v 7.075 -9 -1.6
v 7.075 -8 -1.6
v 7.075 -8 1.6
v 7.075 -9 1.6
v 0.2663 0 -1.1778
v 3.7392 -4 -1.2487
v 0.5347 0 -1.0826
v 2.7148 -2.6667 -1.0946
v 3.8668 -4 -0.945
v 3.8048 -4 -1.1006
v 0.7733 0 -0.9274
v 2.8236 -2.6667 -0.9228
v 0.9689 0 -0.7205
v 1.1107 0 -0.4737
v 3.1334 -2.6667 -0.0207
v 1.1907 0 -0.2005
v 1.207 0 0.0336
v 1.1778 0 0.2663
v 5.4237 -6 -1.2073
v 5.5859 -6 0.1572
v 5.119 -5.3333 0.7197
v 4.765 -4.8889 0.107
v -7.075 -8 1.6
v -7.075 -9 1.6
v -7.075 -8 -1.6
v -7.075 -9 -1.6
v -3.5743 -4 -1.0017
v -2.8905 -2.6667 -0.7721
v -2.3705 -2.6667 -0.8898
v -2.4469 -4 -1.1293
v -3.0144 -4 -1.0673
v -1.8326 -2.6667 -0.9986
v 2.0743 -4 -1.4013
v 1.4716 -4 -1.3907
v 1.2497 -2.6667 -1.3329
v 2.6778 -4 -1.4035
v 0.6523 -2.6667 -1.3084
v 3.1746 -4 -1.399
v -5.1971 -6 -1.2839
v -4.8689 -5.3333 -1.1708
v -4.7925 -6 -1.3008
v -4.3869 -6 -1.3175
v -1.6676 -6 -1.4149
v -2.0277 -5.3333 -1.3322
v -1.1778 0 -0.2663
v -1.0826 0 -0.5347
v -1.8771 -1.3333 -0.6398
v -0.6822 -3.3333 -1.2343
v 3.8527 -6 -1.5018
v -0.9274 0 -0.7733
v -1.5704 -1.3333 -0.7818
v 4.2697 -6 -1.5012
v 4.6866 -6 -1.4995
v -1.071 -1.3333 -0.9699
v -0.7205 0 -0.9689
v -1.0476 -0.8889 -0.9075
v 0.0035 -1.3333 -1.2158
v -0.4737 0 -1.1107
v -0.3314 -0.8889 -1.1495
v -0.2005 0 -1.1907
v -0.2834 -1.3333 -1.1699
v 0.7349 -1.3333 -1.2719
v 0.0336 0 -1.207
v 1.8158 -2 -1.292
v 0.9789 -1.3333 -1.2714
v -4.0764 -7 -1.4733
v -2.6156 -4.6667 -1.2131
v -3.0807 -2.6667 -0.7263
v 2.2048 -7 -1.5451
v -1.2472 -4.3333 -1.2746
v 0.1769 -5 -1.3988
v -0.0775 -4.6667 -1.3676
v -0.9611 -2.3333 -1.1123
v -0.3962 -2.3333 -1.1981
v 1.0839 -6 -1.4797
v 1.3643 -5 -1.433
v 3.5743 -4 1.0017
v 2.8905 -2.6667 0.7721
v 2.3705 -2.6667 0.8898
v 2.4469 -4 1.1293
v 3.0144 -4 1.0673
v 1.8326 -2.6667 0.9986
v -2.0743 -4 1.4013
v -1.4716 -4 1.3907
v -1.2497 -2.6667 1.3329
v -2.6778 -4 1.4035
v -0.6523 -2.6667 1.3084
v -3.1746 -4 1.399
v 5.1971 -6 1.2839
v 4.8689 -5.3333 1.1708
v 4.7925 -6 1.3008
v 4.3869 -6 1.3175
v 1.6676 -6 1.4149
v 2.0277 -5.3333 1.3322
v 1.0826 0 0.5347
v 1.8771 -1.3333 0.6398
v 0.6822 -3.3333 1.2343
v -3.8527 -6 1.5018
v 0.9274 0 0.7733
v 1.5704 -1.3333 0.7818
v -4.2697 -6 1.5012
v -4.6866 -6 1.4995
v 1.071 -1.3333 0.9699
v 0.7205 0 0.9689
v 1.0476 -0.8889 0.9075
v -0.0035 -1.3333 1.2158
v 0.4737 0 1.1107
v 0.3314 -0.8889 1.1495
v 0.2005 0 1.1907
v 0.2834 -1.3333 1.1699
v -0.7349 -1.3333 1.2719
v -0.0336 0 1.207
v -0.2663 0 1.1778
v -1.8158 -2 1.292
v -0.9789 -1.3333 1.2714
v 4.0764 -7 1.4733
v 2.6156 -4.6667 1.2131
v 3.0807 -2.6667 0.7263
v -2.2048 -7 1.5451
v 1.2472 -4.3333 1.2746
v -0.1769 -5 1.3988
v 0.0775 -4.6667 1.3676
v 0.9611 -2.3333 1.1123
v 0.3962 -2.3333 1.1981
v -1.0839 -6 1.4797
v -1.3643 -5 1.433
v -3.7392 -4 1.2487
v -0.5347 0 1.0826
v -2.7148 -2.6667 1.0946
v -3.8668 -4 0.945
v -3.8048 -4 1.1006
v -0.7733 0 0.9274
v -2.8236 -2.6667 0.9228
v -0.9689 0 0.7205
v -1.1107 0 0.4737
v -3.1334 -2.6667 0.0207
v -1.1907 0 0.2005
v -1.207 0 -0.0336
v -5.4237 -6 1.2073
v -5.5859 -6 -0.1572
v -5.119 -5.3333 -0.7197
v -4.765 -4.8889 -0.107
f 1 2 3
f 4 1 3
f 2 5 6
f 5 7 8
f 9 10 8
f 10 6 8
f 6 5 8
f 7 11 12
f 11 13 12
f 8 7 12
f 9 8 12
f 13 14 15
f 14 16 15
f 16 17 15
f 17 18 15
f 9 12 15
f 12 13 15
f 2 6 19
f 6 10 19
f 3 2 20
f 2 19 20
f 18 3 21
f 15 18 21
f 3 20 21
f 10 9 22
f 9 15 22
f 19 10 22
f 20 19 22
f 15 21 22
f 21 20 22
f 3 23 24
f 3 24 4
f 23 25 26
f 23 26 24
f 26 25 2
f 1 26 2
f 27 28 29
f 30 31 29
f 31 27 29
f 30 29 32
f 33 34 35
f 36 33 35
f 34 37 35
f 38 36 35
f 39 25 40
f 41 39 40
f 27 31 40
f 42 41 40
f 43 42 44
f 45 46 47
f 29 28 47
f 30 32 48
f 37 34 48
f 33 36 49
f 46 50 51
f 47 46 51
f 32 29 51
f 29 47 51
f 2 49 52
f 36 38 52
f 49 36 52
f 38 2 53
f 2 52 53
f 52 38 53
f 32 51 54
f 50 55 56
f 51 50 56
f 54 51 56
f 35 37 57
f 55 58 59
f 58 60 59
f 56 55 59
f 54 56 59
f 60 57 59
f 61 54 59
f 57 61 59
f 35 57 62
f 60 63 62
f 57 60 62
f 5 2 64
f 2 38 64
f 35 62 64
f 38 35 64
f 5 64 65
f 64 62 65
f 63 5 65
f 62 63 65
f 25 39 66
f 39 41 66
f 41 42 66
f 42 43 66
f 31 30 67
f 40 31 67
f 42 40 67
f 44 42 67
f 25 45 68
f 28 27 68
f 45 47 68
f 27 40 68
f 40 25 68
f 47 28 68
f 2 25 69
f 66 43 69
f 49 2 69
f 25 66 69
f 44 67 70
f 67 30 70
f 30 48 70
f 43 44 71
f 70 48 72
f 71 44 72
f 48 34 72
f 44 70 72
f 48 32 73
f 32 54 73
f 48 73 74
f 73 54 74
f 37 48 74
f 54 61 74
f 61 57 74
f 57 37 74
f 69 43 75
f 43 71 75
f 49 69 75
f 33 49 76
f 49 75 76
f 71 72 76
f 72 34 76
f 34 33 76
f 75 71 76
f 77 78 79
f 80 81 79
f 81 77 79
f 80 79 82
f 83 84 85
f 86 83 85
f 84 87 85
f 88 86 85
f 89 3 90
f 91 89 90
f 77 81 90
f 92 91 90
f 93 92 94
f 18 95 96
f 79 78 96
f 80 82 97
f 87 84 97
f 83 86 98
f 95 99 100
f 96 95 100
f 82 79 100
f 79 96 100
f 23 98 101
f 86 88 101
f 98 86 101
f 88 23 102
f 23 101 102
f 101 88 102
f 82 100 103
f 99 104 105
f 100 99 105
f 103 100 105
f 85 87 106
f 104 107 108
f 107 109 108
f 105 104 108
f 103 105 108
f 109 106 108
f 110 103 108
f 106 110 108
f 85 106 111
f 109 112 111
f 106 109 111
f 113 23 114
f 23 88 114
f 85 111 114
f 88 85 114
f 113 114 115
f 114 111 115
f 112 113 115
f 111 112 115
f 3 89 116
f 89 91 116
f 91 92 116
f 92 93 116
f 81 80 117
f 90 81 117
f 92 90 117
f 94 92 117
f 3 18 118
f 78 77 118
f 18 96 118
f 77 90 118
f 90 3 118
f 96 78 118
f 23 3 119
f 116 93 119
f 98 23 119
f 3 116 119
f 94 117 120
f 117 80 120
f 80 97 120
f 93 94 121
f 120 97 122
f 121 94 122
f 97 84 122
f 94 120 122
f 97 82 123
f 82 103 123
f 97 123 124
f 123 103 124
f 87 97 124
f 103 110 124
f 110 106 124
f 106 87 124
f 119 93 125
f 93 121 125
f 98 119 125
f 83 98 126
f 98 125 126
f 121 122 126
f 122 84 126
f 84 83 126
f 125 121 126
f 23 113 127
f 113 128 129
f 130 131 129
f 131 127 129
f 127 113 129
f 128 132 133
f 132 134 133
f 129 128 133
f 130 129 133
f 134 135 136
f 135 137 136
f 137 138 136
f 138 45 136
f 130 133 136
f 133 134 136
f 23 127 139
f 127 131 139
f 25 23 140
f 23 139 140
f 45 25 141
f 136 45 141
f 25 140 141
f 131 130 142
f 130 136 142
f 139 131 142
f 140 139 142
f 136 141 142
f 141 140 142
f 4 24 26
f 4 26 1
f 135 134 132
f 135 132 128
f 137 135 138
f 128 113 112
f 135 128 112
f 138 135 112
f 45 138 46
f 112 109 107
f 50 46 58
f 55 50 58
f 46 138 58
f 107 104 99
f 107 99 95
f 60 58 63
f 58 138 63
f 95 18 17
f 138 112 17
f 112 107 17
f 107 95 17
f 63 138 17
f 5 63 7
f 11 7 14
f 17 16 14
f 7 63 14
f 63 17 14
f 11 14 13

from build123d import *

# Parameters (mm, degrees)
F2_W     = 14.15
F2_H     = 3.2
F4_W     = 14.15
F4_H     = 3.2
F5_DEPTH = 1


# Not quite as in the source:
# - the arcs of a loft's sections are written as splines that run evenly, so that the points pair up as in the source's solid


with BuildPart() as f3:
    # F2 (on offset) → F3 section 0
    with BuildSketch(Plane.XZ.offset(8)):
        Rectangle(F2_W, F2_H)
    # F0 (on Front) → F3 section 1
    with BuildSketch(Plane.XZ):
        with BuildLine():
            add(Edge.make_bspline(
                [(1.1777584175, 0.2663481933), (1.1428935205, 0.4205164097), (1.0773884422, 0.5676916369), (0.8949712684, 0.8258729192), (0.7781309462, 0.9367773911), (0.5107977536, 1.1054977634), (0.3604100674, 1.1632472795), (0.0488599113, 1.2168205944), (-0.112179977, 1.2126233144), (-0.2663481933, 1.1777584175)],
                knots=[0, 0, 0, 0, 0.25, 0.25, 0.5, 0.5, 0.75, 0.75, 1, 1, 1, 1], degree=3))
            add(Edge.make_bspline(
                [(-0.2663481933, 1.1777584175), (-0.4205164097, 1.1428935205), (-0.5676916369, 1.0773884422), (-0.8258729192, 0.8949712684), (-0.9367773911, 0.7781309462), (-1.1054977634, 0.5107977536), (-1.1632472795, 0.3604100674), (-1.2168205944, 0.0488599113), (-1.2126233144, -0.112179977), (-1.1777584175, -0.2663481933)],
                knots=[0, 0, 0, 0, 0.25, 0.25, 0.5, 0.5, 0.75, 0.75, 1, 1, 1, 1], degree=3))
            add(Edge.make_bspline(
                [(-1.1777584175, -0.2663481933), (-1.1428935205, -0.4205164097), (-1.0773884422, -0.5676916369), (-0.8949712684, -0.8258729192), (-0.7781309462, -0.9367773911), (-0.5107977536, -1.1054977634), (-0.3604100674, -1.1632472795), (-0.0488599113, -1.2168205944), (0.112179977, -1.2126233144), (0.2663481933, -1.1777584175)],
                knots=[0, 0, 0, 0, 0.25, 0.25, 0.5, 0.5, 0.75, 0.75, 1, 1, 1, 1], degree=3))
            add(Edge.make_bspline(
                [(0.2663481933, -1.1777584175), (0.4205164097, -1.1428935205), (0.5676916369, -1.0773884422), (0.8258729192, -0.8949712684), (0.9367773911, -0.7781309462), (1.1054977634, -0.5107977536), (1.1632472795, -0.3604100674), (1.2168205944, -0.0488599113), (1.2126233144, 0.112179977), (1.1777584175, 0.2663481933)],
                knots=[0, 0, 0, 0, 0.25, 0.25, 0.5, 0.5, 0.75, 0.75, 1, 1, 1, 1], degree=3))
        make_face()
    loft(ruled=True)

    # F4 (on face) → F5 (join)
    with BuildSketch(Plane.XZ.offset(8)):
        Rectangle(F4_W, F4_H)
    extrude(amount=F5_DEPTH)


solid = f3.part
